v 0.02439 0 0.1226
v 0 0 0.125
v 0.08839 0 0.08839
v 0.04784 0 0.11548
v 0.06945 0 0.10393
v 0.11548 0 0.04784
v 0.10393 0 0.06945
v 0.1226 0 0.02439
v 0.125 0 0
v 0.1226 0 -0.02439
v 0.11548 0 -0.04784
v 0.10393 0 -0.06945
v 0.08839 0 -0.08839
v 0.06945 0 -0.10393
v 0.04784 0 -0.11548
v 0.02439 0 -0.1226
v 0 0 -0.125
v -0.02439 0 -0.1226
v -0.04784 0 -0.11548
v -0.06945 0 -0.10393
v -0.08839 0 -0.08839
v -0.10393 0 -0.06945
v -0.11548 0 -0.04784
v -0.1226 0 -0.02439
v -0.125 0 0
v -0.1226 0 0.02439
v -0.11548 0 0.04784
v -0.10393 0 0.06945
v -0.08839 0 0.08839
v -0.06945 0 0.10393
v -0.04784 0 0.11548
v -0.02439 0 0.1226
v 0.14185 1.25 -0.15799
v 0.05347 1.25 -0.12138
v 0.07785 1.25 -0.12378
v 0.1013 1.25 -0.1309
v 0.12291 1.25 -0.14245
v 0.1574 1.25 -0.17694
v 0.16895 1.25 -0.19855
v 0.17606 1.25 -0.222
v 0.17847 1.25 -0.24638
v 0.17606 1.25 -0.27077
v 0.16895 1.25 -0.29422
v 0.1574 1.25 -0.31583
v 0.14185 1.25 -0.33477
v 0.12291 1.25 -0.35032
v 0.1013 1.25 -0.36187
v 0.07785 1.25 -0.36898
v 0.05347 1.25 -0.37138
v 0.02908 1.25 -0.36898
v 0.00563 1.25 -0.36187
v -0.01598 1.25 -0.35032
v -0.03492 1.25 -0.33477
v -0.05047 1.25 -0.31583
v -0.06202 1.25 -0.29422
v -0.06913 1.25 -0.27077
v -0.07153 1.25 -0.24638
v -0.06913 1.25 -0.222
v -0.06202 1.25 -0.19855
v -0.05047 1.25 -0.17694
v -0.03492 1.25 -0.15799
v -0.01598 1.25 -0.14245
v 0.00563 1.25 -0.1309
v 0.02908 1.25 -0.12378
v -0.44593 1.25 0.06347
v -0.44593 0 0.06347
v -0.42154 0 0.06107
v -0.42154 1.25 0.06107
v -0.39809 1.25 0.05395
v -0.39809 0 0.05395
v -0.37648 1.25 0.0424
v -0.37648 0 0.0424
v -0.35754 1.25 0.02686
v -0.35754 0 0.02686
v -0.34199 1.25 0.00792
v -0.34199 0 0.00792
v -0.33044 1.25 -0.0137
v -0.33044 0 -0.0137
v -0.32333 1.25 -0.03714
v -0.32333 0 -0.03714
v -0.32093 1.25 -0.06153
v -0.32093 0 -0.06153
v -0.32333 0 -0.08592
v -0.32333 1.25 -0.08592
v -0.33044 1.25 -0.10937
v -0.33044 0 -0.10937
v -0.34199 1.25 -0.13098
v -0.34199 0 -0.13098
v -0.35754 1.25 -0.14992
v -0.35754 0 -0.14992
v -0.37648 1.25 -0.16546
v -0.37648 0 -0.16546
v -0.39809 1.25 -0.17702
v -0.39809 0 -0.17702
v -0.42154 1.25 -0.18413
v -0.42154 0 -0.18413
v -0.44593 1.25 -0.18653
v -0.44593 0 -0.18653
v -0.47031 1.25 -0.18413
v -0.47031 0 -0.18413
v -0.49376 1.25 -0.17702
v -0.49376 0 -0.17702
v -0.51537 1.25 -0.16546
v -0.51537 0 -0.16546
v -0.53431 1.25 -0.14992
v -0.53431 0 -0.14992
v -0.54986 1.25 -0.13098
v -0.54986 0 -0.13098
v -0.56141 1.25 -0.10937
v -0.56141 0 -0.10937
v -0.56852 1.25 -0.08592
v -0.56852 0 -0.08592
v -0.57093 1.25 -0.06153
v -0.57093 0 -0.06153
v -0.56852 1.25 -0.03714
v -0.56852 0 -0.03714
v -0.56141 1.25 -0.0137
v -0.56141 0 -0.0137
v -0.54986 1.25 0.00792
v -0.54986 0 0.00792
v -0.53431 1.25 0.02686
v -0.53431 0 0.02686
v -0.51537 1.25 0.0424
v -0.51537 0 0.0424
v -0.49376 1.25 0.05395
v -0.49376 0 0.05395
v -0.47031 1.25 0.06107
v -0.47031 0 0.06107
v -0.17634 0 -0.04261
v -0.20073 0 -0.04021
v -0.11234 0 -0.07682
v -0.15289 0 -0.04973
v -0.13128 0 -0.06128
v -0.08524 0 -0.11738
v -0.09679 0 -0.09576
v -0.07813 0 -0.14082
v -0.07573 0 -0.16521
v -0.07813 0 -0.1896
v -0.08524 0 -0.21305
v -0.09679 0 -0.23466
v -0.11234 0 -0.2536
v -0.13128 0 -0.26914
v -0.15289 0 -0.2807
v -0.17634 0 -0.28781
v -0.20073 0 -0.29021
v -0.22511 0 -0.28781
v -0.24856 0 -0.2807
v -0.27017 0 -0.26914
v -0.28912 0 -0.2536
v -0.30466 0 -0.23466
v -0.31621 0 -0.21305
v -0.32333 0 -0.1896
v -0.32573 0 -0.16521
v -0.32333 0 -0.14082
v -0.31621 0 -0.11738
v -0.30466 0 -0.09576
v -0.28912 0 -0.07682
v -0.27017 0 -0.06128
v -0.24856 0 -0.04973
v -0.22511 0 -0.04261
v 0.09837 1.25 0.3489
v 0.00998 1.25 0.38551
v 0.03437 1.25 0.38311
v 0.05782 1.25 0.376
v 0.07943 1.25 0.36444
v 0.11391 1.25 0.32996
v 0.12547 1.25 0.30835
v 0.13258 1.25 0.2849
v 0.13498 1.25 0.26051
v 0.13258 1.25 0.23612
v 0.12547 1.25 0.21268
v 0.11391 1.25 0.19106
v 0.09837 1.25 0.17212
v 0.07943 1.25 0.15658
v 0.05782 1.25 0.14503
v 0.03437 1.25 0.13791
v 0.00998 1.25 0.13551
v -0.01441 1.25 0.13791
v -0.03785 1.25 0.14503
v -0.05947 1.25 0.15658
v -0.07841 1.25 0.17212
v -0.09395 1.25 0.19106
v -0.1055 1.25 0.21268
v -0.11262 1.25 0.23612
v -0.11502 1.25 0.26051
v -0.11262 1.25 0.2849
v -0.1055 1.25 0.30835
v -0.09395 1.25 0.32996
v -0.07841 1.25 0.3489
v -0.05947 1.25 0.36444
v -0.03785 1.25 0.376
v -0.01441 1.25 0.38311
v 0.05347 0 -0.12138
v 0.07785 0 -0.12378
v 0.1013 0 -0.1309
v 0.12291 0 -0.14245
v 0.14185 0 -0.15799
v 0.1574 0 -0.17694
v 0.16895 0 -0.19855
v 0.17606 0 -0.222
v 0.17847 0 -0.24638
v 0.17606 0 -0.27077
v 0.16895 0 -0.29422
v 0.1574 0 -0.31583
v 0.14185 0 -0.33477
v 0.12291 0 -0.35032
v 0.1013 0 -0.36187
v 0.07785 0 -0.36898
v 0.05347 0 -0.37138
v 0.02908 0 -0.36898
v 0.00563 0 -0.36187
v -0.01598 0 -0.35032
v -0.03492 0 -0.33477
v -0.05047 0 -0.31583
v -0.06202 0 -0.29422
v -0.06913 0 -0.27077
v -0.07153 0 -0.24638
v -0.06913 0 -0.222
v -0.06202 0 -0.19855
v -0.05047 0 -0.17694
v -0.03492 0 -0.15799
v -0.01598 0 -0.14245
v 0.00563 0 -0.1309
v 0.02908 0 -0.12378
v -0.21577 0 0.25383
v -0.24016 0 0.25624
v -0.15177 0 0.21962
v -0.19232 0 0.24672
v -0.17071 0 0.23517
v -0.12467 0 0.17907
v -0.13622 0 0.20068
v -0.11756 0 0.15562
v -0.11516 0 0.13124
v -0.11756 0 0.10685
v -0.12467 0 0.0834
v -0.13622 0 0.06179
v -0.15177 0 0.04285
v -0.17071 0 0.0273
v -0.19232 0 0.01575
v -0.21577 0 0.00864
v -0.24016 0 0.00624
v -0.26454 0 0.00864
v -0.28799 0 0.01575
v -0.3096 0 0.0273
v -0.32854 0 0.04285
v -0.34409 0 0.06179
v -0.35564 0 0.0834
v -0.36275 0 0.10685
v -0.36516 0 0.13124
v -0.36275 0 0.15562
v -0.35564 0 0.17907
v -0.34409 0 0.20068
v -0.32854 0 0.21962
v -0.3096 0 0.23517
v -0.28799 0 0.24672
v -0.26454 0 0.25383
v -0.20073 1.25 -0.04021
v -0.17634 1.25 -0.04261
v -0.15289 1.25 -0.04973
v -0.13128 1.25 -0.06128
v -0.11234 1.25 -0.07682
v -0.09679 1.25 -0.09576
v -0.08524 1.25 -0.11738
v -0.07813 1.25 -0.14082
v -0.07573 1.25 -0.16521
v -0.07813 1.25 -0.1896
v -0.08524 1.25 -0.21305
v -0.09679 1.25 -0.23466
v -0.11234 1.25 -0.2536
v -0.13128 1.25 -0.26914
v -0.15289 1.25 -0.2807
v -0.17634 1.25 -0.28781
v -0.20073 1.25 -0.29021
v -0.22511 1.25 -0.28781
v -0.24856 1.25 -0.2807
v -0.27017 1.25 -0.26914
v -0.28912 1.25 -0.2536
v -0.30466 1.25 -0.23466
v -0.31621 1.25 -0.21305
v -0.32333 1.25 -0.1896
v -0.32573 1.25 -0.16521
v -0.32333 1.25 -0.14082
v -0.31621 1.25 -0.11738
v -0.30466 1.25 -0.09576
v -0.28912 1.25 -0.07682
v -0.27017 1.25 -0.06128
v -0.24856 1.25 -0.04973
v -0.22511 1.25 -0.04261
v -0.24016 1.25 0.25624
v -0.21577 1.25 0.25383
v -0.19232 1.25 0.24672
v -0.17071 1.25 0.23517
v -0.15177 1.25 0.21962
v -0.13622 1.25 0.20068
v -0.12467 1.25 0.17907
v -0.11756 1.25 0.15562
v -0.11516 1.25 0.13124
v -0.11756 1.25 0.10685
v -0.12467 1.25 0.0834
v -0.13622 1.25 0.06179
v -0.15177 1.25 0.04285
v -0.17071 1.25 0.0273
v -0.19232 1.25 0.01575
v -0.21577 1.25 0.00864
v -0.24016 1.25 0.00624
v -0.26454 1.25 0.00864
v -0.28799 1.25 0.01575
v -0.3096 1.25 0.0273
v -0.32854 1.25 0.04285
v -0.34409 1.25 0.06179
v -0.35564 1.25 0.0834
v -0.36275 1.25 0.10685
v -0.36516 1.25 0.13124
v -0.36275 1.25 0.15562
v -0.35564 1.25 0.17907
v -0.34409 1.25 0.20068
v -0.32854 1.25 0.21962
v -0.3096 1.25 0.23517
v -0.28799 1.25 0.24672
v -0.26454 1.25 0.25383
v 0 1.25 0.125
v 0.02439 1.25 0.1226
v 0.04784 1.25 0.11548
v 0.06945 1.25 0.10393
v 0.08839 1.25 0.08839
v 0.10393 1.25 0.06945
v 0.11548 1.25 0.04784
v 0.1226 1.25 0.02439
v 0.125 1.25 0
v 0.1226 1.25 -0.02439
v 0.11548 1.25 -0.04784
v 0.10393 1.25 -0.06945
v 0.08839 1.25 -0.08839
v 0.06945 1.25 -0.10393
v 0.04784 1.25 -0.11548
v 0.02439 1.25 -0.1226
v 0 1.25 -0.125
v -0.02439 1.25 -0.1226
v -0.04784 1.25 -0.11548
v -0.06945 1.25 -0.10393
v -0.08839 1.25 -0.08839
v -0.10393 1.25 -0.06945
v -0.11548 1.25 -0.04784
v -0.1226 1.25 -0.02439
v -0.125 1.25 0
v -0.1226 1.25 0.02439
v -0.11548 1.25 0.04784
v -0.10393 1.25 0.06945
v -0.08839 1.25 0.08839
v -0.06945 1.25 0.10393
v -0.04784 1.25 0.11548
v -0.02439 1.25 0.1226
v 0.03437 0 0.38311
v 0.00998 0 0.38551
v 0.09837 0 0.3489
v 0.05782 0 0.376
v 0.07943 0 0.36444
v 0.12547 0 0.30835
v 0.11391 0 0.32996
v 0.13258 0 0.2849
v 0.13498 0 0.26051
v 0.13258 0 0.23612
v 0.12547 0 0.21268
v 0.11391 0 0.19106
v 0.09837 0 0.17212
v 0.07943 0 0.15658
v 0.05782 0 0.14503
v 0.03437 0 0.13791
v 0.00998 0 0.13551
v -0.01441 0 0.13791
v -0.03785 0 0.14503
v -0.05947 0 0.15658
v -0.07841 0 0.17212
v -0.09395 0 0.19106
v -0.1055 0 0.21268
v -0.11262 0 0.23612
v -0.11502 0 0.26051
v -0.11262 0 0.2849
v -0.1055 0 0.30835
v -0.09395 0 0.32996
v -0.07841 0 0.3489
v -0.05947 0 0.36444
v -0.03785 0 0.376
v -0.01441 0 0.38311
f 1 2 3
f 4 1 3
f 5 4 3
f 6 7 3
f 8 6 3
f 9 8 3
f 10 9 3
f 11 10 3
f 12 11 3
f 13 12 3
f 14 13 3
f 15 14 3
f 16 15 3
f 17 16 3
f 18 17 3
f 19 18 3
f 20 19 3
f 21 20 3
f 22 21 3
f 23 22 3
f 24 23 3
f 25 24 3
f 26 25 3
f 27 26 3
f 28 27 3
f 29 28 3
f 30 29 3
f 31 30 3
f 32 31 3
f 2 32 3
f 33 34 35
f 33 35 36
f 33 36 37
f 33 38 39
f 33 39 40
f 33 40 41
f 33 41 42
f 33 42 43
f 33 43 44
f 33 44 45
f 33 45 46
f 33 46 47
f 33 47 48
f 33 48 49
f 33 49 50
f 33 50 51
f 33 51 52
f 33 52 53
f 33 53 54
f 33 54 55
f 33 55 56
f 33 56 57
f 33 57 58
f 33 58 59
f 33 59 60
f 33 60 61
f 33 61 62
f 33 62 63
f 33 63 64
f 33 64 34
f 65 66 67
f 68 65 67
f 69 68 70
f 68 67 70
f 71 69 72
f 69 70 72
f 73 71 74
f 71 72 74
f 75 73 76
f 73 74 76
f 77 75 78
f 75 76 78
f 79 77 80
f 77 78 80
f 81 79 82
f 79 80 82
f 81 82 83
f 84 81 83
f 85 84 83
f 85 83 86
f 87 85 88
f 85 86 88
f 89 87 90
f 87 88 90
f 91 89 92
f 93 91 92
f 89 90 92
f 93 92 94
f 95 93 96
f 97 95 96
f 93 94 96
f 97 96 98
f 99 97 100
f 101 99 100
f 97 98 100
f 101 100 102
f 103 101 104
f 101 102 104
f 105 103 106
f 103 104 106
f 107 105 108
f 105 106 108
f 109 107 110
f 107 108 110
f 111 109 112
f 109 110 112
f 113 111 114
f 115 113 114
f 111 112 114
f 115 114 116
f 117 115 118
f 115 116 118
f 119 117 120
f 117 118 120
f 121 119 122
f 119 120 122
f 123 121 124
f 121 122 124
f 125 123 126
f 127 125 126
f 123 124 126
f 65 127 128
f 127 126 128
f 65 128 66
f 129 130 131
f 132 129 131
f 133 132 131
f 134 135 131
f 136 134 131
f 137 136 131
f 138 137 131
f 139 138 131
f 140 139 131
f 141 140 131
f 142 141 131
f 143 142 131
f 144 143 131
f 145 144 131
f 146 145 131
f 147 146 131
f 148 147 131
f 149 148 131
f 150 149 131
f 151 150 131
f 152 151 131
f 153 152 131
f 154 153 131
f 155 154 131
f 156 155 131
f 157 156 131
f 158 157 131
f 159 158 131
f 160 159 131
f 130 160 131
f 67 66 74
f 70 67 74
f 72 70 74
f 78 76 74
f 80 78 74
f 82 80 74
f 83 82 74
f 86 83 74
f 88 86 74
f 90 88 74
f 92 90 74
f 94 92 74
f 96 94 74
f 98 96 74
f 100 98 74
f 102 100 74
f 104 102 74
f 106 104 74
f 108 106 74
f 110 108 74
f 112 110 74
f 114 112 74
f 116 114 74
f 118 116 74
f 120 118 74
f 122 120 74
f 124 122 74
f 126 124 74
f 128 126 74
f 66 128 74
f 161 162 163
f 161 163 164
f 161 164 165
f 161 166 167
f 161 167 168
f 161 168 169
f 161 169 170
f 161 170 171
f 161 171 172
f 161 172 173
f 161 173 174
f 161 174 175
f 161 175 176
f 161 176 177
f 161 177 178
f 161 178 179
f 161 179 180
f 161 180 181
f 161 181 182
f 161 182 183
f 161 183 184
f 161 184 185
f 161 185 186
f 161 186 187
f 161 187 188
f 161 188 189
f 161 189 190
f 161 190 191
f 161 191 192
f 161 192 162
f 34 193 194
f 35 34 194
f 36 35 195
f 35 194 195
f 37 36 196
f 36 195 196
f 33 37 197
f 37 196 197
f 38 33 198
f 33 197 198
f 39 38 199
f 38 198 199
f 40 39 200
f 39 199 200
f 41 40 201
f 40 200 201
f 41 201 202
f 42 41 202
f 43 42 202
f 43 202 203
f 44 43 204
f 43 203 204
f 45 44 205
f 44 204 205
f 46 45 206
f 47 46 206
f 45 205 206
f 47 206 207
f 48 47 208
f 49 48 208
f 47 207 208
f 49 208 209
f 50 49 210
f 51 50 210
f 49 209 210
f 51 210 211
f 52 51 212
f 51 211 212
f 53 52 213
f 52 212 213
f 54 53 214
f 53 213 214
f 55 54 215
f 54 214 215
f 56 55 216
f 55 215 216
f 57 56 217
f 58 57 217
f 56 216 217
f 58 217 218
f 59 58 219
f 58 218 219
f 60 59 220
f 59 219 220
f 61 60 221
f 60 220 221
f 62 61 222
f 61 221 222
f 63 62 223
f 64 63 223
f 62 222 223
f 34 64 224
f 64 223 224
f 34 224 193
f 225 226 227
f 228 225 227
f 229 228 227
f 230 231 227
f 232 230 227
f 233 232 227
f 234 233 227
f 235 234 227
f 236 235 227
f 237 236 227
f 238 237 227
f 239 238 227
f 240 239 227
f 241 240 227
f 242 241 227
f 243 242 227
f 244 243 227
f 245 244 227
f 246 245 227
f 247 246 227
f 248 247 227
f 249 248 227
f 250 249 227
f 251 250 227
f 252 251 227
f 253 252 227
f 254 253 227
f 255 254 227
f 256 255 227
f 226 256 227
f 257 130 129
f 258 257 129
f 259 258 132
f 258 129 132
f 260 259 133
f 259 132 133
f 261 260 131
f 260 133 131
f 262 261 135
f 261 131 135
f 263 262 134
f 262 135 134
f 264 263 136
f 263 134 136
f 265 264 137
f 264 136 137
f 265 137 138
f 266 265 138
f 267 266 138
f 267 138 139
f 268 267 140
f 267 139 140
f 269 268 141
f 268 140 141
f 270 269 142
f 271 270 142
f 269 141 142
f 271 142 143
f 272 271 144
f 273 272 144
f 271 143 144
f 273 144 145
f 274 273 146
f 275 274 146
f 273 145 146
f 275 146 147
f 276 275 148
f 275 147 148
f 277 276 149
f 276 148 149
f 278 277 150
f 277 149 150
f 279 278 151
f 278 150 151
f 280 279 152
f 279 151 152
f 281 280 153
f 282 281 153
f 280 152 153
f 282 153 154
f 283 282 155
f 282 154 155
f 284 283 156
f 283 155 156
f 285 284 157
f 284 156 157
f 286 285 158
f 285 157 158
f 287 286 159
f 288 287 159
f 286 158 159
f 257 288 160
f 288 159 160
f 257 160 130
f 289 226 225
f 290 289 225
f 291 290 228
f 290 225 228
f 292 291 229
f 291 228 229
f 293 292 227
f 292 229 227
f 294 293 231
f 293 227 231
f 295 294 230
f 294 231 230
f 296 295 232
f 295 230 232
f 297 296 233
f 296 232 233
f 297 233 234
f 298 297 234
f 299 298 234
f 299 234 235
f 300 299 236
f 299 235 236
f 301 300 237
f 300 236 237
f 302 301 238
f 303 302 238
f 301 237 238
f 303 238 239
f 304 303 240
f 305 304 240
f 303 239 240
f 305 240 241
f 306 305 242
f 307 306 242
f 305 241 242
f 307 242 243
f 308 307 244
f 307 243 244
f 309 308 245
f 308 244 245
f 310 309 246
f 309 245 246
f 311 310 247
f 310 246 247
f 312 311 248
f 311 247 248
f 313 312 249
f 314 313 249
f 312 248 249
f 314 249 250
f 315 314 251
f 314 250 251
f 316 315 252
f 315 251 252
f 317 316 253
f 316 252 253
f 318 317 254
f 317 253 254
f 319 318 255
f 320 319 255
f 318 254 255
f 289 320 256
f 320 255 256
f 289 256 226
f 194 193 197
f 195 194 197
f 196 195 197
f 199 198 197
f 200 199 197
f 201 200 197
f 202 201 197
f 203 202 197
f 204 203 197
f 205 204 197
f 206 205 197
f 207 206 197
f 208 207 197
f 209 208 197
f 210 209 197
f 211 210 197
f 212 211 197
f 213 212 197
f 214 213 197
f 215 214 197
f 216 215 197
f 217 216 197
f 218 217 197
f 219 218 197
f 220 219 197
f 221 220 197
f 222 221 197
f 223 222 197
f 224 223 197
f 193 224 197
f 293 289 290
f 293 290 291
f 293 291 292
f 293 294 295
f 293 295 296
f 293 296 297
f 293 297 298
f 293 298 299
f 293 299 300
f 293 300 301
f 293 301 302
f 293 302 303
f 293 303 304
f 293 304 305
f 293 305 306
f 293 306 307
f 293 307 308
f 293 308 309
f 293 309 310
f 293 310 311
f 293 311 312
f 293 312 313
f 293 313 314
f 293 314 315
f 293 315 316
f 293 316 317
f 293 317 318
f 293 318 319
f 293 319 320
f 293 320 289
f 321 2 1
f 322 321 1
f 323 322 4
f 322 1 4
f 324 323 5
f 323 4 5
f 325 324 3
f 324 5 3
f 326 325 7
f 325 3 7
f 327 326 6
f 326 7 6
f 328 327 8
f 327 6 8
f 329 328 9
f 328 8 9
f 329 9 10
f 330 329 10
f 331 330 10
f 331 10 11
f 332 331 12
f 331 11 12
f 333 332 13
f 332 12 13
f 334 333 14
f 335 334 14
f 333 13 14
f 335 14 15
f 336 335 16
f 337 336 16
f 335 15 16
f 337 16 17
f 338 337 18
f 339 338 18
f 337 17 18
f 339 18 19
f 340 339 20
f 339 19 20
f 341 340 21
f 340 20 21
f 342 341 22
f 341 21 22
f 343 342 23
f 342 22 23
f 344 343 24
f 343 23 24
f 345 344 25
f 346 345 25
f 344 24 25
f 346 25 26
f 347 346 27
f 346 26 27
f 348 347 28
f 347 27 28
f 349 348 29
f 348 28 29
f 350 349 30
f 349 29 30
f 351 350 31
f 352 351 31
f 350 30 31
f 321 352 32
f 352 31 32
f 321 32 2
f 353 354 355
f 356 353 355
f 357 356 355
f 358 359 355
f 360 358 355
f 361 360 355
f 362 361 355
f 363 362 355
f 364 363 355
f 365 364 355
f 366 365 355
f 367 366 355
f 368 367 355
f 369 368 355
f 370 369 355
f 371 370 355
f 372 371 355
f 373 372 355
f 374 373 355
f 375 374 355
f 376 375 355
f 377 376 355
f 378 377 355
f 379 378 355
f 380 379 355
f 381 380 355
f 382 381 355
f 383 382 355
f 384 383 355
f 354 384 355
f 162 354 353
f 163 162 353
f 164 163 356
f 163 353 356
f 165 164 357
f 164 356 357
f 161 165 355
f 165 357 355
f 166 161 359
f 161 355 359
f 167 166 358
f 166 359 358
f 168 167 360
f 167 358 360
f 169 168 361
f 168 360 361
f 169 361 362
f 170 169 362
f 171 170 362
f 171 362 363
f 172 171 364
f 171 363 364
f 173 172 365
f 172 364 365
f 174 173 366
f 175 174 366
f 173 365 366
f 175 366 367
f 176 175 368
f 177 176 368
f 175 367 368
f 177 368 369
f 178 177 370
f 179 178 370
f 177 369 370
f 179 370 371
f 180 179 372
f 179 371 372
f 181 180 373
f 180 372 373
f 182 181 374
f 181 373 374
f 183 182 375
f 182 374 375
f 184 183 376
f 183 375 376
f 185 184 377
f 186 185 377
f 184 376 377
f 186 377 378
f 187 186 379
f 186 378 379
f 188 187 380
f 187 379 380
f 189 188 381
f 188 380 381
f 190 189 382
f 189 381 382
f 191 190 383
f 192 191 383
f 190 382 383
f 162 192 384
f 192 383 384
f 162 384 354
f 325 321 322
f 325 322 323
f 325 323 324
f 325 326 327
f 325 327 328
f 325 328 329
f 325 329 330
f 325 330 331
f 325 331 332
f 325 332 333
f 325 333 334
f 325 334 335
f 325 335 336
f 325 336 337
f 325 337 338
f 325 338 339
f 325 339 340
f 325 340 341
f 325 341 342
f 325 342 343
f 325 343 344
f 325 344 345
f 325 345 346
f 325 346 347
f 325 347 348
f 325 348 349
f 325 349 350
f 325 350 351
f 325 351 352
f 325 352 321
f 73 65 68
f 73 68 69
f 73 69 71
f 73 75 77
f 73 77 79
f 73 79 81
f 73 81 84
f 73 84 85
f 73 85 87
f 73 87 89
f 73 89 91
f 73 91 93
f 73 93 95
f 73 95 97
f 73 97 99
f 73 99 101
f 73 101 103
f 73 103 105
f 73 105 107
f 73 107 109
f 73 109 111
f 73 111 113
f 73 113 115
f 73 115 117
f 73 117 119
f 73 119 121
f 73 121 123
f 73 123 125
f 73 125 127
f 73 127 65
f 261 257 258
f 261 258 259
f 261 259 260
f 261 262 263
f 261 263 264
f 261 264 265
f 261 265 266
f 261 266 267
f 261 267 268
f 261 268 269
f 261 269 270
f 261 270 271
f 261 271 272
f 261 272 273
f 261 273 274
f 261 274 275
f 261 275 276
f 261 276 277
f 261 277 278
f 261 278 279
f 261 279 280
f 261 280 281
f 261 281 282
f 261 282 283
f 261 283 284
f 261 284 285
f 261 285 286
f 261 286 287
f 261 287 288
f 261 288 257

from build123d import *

# Parameters (mm, degrees)
SKETCH1_R             = 0.125
BOSS_EXTRUDE1_DEPTH   = 1.25
BOSS_EXTRUDE1_2_DEPTH = 1.25
BOSS_EXTRUDE1_3_DEPTH = 1.25
BOSS_EXTRUDE1_4_DEPTH = 1.25
BOSS_EXTRUDE1_5_DEPTH = 1.25
BOSS_EXTRUDE1_6_DEPTH = 1.25


with BuildPart() as part:
    # Sketch1 → Boss-Extrude1 (new body)
    with BuildSketch(Plane(origin=(0, 0, 0), x_dir=(1, 0, 0), z_dir=(0, 1, 0))):
        with Locations(Location((0, 0, 0), (0, 0, 270))):
            Circle(SKETCH1_R)
    extrude(amount=BOSS_EXTRUDE1_DEPTH)


with BuildPart() as body_2:
    # Sketch1 → Boss-Extrude1 2 (new body)
    with BuildSketch(Plane(origin=(0, 0, 0), x_dir=(1, 0, 0), z_dir=(0, 1, 0))):
        with Locations(Location((-0.200728238, 0.165210686, 0), (0, 0, 270))):
            Circle(SKETCH1_R)
    extrude(amount=BOSS_EXTRUDE1_2_DEPTH)


with BuildPart() as body_3:
    # Sketch1 → Boss-Extrude1 3 (new body)
    with BuildSketch(Plane(origin=(0, 0, 0), x_dir=(1, 0, 0), z_dir=(0, 1, 0))):
        with Locations(Location((0.053466013, 0.24638196, 0), (0, 0, 270))):
            Circle(SKETCH1_R)
    extrude(amount=BOSS_EXTRUDE1_3_DEPTH)


with BuildPart() as body_4:
    # Sketch1 → Boss-Extrude1 4 (new body)
    with BuildSketch(Plane(origin=(0, 0, 0), x_dir=(1, 0, 0), z_dir=(0, 1, 0))):
        with Locations(Location((-0.445926201, 0.061530931, 0), (0, 0, 270))):
            Circle(SKETCH1_R)
    extrude(amount=BOSS_EXTRUDE1_4_DEPTH)


with BuildPart() as body_5:
    # Sketch1 → Boss-Extrude1 5 (new body)
    with BuildSketch(Plane(origin=(0, 0, 0), x_dir=(1, 0, 0), z_dir=(0, 1, 0))):
        with Locations(Location((-0.240156126, -0.131235088, 0), (0, 0, 270))):
            Circle(SKETCH1_R)
    extrude(amount=BOSS_EXTRUDE1_5_DEPTH)


with BuildPart() as body_6:
    # Sketch1 → Boss-Extrude1 6 (new body)
    with BuildSketch(Plane(origin=(0, 0, 0), x_dir=(1, 0, 0), z_dir=(0, 1, 0))):
        with Locations(Location((0.009980731, -0.260510711, 0), (0, 0, 270))):
            Circle(SKETCH1_R)
    extrude(amount=BOSS_EXTRUDE1_6_DEPTH)


solid = Compound([part.part, body_2.part, body_3.part, body_4.part, body_5.part, body_6.part])
